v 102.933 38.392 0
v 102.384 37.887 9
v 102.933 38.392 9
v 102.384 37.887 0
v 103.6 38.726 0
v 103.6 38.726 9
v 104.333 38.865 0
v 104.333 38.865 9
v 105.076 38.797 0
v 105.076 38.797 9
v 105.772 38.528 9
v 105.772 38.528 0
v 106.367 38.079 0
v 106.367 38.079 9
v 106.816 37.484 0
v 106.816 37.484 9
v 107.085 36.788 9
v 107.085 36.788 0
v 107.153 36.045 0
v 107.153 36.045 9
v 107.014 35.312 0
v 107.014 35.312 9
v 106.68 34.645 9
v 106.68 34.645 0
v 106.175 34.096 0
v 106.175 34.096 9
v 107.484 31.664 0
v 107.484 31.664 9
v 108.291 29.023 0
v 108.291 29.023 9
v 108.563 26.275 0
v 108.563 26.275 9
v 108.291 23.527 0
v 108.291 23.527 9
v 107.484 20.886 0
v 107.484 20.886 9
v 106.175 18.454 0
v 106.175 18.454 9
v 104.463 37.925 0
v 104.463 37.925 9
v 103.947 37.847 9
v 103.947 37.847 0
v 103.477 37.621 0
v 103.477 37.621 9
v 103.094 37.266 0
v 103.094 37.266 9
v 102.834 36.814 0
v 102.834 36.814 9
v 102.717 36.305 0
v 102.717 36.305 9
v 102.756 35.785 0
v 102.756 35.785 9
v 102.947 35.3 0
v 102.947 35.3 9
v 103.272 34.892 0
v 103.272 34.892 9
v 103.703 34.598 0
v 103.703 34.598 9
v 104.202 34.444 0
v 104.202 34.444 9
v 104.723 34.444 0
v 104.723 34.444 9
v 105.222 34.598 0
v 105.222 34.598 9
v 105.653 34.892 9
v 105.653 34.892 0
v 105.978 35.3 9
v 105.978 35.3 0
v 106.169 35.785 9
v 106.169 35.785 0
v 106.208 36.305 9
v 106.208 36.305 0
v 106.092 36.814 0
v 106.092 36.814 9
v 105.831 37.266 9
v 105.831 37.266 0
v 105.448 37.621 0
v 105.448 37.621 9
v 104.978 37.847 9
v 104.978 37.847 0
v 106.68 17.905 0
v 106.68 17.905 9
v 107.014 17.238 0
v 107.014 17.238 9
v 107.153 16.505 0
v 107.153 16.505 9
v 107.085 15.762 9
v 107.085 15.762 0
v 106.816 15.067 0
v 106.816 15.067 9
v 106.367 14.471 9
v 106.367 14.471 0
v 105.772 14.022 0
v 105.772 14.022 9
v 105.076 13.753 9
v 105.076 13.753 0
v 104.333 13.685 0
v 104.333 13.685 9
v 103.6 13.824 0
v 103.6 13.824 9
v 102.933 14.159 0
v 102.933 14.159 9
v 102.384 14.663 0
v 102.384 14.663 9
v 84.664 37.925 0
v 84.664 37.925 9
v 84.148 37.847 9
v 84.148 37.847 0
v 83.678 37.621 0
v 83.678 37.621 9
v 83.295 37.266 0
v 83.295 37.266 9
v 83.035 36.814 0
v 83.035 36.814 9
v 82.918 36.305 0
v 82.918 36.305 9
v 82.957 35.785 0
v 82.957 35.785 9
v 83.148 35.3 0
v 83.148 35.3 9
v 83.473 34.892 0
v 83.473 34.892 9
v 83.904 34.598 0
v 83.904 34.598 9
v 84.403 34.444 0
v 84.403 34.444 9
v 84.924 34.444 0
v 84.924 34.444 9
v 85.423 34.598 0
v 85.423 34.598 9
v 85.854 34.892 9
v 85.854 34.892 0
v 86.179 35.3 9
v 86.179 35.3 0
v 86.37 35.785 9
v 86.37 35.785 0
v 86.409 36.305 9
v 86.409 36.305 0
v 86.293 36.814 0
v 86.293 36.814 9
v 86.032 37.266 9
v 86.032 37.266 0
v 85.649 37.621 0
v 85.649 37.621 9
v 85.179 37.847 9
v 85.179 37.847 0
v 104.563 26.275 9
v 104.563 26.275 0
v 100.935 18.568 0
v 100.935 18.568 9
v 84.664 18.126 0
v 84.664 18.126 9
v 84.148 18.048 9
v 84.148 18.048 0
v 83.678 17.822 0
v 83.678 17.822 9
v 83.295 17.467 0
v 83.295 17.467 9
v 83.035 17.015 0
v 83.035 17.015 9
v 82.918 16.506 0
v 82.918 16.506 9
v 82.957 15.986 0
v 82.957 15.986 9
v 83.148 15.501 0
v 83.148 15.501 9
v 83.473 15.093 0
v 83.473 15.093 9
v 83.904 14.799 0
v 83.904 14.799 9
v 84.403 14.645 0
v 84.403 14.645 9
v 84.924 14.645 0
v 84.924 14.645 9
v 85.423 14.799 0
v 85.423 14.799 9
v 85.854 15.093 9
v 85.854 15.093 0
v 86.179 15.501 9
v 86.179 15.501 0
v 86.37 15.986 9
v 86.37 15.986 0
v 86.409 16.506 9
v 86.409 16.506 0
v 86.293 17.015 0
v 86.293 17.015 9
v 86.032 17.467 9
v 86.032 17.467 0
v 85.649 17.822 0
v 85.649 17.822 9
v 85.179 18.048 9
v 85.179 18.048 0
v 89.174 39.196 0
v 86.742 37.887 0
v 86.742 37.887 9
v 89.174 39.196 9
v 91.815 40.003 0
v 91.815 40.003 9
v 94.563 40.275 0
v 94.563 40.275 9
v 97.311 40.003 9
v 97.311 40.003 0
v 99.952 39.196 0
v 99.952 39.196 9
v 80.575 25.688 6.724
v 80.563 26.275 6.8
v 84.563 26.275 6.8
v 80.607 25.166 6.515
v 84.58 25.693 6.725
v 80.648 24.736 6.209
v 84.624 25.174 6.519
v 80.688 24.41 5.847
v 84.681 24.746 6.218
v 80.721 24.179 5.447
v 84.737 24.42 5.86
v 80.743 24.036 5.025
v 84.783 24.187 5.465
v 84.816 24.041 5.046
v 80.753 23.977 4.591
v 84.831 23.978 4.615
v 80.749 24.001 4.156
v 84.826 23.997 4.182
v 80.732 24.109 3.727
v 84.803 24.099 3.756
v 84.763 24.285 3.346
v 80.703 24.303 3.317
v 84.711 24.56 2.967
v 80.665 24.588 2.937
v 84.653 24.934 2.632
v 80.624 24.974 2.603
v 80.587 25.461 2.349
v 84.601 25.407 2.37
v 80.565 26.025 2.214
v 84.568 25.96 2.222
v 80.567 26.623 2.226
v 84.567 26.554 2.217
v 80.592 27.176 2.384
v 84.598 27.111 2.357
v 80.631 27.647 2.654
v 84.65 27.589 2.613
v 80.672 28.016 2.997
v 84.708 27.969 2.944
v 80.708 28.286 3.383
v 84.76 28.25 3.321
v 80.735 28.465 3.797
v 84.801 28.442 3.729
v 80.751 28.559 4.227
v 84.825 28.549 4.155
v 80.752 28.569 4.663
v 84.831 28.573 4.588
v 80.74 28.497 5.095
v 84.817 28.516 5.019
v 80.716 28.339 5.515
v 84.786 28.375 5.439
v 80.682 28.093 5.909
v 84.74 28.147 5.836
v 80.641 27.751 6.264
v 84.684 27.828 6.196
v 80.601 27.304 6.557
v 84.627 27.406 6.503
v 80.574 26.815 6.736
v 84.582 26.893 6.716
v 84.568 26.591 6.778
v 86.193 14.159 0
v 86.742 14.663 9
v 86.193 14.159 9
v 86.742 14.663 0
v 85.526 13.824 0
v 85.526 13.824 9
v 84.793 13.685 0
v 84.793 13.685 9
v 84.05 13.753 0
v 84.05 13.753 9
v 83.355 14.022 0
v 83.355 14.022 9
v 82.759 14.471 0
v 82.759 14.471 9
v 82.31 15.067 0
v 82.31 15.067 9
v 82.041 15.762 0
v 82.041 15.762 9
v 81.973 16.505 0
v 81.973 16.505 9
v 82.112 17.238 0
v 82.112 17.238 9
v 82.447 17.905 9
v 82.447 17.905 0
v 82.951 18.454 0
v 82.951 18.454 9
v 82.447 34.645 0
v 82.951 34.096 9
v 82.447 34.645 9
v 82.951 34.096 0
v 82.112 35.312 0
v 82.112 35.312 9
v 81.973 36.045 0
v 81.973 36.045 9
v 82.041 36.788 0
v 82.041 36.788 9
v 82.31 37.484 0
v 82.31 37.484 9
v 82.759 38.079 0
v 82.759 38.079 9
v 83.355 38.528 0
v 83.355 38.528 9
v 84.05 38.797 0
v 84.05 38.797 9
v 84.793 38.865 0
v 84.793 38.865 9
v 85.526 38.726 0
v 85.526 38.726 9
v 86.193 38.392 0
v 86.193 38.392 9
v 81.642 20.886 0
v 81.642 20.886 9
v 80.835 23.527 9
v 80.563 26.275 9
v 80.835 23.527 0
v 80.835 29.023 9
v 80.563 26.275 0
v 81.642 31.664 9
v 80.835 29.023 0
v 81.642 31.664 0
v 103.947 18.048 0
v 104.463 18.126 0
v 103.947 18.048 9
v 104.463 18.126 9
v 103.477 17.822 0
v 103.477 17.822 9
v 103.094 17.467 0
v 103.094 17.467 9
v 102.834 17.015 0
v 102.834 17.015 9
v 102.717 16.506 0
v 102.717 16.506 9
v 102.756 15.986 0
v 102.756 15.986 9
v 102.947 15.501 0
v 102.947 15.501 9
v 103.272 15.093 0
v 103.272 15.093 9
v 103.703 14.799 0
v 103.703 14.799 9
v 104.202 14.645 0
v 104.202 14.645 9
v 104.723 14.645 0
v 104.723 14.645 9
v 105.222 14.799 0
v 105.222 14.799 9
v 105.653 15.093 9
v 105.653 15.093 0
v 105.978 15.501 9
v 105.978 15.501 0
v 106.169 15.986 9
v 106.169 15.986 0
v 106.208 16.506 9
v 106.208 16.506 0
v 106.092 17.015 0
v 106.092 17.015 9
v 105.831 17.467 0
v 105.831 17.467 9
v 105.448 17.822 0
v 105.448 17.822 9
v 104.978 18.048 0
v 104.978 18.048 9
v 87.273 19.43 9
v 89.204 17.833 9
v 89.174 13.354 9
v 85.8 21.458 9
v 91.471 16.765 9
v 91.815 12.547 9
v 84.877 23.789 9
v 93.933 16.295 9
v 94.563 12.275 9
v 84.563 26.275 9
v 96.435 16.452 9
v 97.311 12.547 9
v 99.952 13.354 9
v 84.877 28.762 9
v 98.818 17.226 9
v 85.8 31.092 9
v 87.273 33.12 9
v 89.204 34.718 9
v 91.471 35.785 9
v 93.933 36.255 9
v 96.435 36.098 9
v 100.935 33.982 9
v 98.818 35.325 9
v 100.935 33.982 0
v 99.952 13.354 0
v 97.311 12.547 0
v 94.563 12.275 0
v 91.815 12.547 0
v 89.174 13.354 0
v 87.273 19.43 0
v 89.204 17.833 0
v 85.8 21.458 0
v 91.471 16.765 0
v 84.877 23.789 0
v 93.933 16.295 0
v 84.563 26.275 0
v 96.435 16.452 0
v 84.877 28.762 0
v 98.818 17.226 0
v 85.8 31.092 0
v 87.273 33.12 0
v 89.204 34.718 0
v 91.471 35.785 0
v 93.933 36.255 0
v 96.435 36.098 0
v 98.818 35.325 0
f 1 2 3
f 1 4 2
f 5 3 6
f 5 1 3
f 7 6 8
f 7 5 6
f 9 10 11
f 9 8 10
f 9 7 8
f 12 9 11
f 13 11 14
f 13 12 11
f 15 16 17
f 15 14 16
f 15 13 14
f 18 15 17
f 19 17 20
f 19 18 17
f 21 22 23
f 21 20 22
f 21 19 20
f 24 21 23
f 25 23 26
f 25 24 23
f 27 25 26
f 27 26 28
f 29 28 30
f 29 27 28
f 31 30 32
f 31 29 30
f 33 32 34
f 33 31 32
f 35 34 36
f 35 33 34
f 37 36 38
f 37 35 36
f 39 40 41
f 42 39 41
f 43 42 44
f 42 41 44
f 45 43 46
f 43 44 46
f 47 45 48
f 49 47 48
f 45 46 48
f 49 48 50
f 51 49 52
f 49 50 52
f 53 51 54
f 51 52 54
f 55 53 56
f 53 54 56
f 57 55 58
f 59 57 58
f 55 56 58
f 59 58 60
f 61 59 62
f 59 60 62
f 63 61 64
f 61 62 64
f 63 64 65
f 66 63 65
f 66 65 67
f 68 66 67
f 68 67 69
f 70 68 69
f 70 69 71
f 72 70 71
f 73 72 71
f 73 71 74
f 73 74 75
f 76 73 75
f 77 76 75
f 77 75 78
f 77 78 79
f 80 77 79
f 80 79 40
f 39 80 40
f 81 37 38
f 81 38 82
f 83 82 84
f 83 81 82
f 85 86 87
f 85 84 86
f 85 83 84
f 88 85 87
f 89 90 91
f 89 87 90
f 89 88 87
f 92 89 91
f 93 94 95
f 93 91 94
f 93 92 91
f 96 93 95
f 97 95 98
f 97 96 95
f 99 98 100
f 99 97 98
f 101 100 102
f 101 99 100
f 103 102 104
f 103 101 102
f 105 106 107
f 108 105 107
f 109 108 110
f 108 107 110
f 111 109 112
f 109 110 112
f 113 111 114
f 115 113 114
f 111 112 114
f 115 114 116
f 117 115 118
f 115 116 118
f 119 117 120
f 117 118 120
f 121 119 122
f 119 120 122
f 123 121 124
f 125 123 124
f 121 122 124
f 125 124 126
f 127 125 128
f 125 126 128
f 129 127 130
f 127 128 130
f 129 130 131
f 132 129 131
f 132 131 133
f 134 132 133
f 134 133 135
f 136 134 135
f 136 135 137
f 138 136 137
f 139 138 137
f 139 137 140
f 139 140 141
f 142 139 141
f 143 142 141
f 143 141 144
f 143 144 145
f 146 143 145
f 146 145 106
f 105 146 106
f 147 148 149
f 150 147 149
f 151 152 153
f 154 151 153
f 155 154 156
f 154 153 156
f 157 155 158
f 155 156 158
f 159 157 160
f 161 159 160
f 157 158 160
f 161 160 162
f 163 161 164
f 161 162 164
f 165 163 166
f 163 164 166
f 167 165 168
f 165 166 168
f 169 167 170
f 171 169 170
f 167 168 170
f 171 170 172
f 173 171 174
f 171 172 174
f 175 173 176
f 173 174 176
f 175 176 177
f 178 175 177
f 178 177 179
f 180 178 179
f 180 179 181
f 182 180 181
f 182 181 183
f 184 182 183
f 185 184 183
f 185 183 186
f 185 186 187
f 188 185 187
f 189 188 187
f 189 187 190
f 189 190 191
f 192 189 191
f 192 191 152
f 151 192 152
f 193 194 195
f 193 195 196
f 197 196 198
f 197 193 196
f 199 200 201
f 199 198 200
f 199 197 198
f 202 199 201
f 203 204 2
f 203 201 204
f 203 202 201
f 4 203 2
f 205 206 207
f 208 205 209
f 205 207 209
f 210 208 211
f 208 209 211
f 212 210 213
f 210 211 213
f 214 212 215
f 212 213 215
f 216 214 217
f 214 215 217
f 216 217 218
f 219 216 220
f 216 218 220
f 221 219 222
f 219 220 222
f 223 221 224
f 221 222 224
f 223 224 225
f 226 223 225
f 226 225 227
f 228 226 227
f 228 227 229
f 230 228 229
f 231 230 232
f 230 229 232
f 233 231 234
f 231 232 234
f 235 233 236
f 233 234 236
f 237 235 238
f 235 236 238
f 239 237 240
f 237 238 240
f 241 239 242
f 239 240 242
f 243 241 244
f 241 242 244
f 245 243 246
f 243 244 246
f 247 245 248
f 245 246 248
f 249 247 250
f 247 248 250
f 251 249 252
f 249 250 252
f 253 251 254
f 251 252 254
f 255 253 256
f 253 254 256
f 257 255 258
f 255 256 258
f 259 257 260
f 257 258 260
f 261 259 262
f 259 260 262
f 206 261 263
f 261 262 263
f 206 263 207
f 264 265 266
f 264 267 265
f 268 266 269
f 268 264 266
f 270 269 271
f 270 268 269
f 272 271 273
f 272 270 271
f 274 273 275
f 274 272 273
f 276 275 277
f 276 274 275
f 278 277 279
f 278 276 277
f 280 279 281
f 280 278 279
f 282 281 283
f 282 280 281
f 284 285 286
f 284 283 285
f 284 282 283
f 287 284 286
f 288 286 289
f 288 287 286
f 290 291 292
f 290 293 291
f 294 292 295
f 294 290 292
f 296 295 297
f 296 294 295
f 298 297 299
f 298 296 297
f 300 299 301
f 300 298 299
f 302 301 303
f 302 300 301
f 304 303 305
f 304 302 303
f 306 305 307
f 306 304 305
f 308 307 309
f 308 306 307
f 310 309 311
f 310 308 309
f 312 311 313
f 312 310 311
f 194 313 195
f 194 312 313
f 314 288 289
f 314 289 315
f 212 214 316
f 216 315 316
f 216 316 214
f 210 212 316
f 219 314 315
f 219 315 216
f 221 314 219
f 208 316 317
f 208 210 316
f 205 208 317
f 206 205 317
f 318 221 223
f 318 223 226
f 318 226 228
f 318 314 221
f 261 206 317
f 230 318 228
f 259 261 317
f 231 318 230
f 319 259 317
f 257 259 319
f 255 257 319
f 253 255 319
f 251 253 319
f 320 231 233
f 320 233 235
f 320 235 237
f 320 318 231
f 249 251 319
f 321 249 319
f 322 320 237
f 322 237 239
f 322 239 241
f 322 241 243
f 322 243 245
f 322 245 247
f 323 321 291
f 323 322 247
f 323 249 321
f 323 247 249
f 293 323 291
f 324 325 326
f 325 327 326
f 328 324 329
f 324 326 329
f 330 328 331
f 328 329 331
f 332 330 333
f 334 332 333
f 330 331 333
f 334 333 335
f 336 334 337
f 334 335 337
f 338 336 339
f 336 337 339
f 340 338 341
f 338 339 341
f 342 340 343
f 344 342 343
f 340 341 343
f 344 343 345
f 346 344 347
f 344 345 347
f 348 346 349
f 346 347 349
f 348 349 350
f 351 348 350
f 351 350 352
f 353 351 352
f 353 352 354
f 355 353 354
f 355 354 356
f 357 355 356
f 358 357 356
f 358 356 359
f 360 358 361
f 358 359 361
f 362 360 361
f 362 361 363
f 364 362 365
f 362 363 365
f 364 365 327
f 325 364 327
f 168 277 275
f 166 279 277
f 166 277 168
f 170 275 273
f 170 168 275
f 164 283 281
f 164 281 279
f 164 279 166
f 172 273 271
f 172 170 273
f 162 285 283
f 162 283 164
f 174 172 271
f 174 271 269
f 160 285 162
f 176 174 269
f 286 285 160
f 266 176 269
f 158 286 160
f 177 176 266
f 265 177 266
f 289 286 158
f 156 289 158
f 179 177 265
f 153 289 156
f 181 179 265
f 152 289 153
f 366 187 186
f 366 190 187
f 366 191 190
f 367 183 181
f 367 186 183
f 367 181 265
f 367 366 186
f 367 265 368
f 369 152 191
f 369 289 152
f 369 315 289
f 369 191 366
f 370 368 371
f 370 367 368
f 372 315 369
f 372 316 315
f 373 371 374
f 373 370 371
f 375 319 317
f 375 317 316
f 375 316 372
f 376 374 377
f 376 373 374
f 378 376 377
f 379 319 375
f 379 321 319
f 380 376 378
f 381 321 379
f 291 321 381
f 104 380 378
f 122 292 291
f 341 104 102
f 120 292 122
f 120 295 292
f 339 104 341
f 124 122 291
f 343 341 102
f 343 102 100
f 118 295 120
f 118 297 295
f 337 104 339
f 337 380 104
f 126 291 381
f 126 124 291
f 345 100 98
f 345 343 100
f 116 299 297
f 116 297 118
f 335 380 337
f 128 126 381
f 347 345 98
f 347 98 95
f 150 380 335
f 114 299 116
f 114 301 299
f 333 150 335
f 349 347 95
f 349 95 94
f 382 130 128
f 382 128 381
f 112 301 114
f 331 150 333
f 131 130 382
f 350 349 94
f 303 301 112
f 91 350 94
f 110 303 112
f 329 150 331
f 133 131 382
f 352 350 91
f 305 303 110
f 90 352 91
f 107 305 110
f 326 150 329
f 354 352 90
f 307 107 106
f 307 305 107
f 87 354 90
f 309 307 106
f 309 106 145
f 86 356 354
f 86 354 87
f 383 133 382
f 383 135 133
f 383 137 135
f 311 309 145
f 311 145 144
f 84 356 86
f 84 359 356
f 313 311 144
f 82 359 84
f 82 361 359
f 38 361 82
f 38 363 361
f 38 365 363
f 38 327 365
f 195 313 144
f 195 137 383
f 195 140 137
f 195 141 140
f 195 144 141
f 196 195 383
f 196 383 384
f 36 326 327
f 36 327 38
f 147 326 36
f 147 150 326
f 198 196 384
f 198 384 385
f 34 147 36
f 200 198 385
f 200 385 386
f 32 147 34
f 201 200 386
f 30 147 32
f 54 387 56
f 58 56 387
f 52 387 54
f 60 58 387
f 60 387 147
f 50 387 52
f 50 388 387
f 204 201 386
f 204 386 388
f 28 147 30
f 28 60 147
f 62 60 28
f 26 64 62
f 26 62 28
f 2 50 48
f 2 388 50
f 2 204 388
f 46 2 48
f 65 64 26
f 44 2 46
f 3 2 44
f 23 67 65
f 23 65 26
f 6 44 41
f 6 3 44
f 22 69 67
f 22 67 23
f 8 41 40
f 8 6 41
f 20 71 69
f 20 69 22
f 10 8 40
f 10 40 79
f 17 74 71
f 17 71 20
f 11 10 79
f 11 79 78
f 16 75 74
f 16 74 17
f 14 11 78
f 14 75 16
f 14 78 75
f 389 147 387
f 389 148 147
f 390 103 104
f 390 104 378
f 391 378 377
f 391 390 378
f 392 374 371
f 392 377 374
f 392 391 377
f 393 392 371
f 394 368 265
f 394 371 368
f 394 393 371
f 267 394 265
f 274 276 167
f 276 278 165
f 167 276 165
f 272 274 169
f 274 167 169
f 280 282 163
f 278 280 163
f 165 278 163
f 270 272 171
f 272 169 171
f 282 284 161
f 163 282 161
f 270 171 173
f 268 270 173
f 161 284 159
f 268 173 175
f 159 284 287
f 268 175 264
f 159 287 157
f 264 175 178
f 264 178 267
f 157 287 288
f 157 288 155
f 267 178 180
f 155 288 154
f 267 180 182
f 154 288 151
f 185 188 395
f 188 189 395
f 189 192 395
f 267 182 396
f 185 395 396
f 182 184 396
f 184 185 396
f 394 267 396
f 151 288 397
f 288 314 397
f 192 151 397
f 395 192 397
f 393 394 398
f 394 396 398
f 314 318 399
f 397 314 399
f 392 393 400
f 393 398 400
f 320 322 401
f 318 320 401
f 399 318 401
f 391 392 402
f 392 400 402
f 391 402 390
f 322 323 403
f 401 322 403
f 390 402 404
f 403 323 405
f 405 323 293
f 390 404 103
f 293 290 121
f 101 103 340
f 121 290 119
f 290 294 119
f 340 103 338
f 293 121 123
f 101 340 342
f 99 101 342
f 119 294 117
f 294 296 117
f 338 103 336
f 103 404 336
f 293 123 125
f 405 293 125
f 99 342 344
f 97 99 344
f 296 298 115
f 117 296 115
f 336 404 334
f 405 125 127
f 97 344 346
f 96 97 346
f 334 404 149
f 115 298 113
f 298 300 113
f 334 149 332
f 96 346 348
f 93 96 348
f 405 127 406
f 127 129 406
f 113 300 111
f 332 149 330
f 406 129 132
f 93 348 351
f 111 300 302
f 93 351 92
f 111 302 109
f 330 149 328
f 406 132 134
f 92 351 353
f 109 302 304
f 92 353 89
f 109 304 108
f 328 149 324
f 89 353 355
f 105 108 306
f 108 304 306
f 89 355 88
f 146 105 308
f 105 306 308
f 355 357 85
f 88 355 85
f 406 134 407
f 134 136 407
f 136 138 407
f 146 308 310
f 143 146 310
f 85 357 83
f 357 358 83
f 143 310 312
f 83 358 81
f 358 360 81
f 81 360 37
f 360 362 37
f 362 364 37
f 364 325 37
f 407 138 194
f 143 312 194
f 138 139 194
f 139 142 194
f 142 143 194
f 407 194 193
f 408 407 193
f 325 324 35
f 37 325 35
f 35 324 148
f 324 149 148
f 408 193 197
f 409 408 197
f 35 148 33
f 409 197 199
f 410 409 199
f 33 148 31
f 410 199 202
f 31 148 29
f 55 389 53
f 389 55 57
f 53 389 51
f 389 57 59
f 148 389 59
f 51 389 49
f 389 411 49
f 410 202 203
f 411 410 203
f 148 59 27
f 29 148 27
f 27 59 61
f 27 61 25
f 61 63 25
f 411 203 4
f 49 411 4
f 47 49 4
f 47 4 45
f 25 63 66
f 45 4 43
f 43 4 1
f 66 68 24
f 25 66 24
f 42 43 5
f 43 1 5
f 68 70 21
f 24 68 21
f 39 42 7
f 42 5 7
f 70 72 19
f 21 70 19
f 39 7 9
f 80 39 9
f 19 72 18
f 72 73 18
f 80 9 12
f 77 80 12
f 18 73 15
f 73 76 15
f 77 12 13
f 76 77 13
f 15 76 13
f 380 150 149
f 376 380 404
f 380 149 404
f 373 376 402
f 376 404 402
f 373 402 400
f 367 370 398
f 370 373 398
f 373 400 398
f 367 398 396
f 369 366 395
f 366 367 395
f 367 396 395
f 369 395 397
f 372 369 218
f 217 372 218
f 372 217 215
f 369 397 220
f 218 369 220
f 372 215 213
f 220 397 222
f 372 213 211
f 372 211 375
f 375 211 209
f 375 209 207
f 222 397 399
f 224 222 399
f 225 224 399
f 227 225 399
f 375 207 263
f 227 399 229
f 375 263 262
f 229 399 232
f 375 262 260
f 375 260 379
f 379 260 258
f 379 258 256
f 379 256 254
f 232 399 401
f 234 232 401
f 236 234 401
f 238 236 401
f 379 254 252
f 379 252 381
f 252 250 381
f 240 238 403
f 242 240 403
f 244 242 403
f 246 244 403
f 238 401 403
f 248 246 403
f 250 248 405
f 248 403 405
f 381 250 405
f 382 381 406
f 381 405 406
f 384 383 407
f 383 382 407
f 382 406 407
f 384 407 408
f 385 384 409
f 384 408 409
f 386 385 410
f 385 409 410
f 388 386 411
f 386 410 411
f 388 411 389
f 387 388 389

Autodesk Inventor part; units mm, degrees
ref_plane "YZ Plane" through (0, 0, 0) normal (1, 0, 0) x (0, 1, 0)
ref_plane "XZ Plane" through (0, 0, 0) normal (0, 1, 0) x (-1, 0, 0)
ref_plane "XY Plane" through (0, 0, 0) normal (0, 0, 1) x (1, 0, 0)
sketch "Sketch1" plane through (0, 0, 0) normal (0, 0, 1) x (1, 0, 0)
  circle A0 centre (84.6636, 36.1746) radius 1.1933 projected
  circle A1 centre (104.4626, 36.1746) radius 1.1933 projected
  circle A2 centre (104.4626, 16.3756) radius 1.1933 projected
  circle A3 centre (84.6636, 16.3756) radius 1.1933 projected
  circle A4 centre (94.5631, 26.2751) radius 10 projected
  circle A5 centre (94.5631, 26.2751) radius 14
  arc A6 (106.175, 34.0958) -> (102.3838, 37.887) centre (104.4626, 36.1746) ccw
  arc A7 (86.7424, 37.887) -> (82.9512, 34.0958) centre (84.6636, 36.1746) ccw
  arc A8 (82.9512, 18.4544) -> (86.7424, 14.6632) centre (84.6636, 16.3756) ccw
  arc A9 (102.3838, 14.6632) -> (106.175, 18.4544) centre (104.4626, 16.3756) ccw
  line L0 (80.5631, 26.2751) -> (108.5631, 26.2751) construction
  line L1 (104.5631, 26.2751) -> (100.935, 18.568)
  line L2 (104.5631, 26.2751) -> (100.935, 33.9822)
  circle A10 centre (94.0631, 26.2751) radius 9.5 construction
  point P0 (0, 0)
  dimension "d0" = 4
  dimension "d1" = 1.5
  dimension "d2" = 1.5
  dimension "d3" = 1.5
  dimension "d4" = 1.5
  dimension "d7" = 19
extrude "Extrusion1" add sketch "Sketch1" along normal blind 9 contours A0 A5 | A0 A5 A1 A2 A3 | A5 A0 | A0 A5 A7 | A6 A5 A1 | A5 A3 A8 | A5 A1 | A1 A5 | A5 A3 | A3 A5 | A5 A2 A9 | A5 A2 | A2 A5 | L2 A4 | A4 L1
hole "Hole1" at (104.4626, 16.3756, 0) at (84.6636, 16.3756, 0) at (84.6636, 36.1746, 0) at (104.4626, 36.1746, 0) direction (0, 0, 1) diameter 3.5 end through all clearance for "Countersunk Head GOST 12876-67" size "M3" standard "GOST"
sketch "Sketch2" plane through (0, 0, 0) normal (1, 0, 0) x (0, 1, 0)
  line L0 (34.0958, 0) -> (18.4544, 0) projected
  line L1 (18.4544, 0) -> (18.4544, 9) projected
  line L2 (34.0958, 9) -> (18.4544, 9) projected
  line L3 (34.0958, 0) -> (34.0958, 9) projected
  line L4 (26.2751, 0) -> (26.2751, 9) projected
  point P0 (0, 0)
  point P1 (26.2751, 4.5)
hole "Hole2" at (0, 26.2751, 4.5) direction (1, 0, 0) diameter 4.6 depth 87.5 tip angle 118
properties part number "marker_holder"
